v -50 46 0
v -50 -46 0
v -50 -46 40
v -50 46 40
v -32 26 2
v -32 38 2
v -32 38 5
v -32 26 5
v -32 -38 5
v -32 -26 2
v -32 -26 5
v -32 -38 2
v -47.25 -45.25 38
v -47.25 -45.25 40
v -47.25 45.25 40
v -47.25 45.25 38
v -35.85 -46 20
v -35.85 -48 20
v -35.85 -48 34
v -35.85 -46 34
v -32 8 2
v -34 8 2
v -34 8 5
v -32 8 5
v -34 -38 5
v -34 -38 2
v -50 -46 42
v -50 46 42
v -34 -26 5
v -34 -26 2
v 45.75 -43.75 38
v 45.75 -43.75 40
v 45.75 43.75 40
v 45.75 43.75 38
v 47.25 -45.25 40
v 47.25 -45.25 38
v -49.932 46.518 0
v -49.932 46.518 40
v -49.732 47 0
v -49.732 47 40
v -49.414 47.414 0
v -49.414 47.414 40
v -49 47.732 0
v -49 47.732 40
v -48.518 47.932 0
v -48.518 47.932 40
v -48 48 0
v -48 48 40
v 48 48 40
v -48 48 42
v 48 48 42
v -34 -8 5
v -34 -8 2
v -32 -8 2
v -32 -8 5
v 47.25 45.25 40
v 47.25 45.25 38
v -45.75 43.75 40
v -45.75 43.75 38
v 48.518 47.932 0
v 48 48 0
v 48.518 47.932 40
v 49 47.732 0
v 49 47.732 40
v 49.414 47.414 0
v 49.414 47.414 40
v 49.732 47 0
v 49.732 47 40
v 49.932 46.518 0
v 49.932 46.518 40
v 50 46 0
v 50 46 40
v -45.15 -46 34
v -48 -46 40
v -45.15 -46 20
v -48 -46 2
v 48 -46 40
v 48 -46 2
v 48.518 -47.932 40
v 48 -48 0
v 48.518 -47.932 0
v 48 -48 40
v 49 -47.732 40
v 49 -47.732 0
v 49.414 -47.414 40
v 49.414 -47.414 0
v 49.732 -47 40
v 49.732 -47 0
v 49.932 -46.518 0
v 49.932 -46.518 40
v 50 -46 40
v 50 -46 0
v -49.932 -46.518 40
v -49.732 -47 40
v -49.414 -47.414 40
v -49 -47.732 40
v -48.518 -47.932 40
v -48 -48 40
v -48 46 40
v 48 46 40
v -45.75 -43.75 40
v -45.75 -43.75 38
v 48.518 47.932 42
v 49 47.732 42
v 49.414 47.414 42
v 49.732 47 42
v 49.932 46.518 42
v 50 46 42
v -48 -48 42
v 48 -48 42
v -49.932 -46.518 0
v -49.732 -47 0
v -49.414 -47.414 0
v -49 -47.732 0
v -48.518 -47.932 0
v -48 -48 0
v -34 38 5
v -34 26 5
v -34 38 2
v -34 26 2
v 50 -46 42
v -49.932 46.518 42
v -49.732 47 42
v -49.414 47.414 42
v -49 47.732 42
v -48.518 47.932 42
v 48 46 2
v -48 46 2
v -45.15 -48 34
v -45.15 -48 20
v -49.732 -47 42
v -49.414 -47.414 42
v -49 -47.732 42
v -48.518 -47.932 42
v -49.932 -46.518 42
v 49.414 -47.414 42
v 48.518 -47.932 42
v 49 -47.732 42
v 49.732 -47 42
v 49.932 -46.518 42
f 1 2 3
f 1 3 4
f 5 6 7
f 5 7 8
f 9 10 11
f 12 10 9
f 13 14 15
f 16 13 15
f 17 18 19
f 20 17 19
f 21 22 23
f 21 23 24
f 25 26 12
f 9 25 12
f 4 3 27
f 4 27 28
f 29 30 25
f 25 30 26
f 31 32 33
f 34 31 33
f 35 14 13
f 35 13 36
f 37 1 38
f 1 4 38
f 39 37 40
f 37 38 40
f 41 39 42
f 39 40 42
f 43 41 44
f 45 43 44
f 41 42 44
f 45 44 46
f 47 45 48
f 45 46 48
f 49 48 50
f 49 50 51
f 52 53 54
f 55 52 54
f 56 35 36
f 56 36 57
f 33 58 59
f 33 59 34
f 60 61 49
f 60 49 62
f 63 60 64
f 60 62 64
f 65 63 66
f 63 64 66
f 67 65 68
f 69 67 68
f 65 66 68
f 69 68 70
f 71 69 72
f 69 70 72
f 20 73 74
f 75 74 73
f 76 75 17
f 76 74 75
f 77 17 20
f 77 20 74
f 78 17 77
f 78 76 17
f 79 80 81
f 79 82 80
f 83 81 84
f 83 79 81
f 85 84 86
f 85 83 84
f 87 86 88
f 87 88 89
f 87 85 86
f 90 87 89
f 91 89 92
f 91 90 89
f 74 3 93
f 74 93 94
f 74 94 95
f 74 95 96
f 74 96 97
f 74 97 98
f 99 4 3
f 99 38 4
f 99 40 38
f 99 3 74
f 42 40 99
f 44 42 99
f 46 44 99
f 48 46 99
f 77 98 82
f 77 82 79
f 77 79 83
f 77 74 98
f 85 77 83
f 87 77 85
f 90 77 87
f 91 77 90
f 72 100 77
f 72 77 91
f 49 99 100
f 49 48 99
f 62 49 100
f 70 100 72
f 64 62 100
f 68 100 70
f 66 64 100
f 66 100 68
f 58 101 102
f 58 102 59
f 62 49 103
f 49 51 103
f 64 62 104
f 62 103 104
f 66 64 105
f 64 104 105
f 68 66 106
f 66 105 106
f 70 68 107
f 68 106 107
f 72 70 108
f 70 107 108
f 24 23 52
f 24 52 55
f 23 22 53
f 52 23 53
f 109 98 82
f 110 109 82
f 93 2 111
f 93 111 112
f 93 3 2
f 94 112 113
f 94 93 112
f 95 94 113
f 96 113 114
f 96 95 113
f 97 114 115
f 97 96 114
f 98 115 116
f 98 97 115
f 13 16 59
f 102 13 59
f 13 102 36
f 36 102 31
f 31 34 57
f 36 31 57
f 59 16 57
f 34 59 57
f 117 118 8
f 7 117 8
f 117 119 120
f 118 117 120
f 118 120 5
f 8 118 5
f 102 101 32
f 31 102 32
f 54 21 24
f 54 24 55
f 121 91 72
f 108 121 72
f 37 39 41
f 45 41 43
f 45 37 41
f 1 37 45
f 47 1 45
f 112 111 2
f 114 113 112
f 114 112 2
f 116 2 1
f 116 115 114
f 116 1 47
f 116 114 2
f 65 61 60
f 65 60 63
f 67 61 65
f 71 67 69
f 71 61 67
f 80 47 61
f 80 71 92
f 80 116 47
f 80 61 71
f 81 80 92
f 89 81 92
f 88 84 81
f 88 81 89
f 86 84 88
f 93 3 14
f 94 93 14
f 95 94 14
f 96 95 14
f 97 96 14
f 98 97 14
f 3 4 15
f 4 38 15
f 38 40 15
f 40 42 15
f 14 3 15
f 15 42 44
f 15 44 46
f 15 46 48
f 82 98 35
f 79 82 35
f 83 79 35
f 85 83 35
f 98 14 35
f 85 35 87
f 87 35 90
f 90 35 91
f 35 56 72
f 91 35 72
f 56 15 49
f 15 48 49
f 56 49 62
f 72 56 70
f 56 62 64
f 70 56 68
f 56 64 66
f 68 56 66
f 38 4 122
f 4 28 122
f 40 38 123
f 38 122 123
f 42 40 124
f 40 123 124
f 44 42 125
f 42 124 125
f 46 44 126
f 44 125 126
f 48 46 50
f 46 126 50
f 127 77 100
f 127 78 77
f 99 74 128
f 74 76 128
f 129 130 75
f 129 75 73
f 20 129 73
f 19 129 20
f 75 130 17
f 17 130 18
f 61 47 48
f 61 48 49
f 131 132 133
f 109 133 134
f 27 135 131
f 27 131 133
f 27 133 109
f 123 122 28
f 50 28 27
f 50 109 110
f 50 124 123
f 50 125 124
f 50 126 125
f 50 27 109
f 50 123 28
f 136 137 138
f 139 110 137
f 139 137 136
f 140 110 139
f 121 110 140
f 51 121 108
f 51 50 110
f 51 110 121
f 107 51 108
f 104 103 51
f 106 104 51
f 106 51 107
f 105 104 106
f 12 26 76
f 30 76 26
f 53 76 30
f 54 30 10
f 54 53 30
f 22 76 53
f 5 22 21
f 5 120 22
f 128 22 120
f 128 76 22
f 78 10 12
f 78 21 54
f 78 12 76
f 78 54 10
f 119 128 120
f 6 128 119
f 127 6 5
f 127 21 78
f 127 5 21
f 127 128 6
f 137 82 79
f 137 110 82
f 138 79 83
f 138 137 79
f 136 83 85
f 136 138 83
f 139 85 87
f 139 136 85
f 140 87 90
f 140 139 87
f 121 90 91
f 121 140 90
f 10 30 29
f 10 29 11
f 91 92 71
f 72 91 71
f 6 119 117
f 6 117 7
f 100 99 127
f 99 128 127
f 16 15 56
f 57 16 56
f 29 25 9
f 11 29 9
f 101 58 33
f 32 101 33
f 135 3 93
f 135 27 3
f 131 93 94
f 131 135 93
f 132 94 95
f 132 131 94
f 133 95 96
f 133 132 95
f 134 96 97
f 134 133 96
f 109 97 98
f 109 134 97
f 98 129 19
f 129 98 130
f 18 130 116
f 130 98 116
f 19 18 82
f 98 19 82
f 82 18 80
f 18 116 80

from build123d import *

# Parameters (mm, degrees)
F0_W      = 100
F0_H      = 96
F1_DEPTH  = 40
F2_T      = -2
F3_W      = 9.3
F3_H      = 14
F4_DEPTH  = 2
F5_W      = 2
F5_H      = 12
F5_H_2    = 16
F6_DEPTH  = 5
F7_R      = 2
F9_W      = 100
F9_H      = 96
F10_DEPTH = 2
F8_W      = 94.5
F8_H      = 90.5
F8_W_2    = 91.5
F8_H_2    = 87.5
F11_DEPTH = 2
F12_R     = 2


# Not quite as in the source:
# - a feature names something its author has since deleted; it is built from what else it names


with BuildPart() as f1:
    # F0 (on Top) → F1 (new body)
    with BuildSketch(Plane.XY):
        Rectangle(F0_W, F0_H)
    extrude(amount=F1_DEPTH)

    # F2
    f2_openings = [f1.faces().sort_by_distance(p)[0] for p in [
        (0, 0, 40),
    ]]
    offset(amount=F2_T, openings=f2_openings)

    # F3 (on face) → F4 (cut, through all)
    with BuildSketch(Plane.XZ.offset(48)):
        with Locations((-40.5, 27)):
            Rectangle(F3_W, F3_H)
    extrude(amount=-F4_DEPTH, mode=Mode.SUBTRACT)

    # F5 (on face) → F6 (join)
    with BuildSketch(Plane(origin=(0, 0, 0), x_dir=(1, 0, 0), z_dir=(0, 0, -1))):
        with Locations((-33, 32)):
            Rectangle(F5_W, F5_H)
        with Locations((-33, 0)):
            Rectangle(F5_W, F5_H_2)
        with Locations((-33, -32)):
            Rectangle(F5_W, F5_H)
    extrude(amount=-F6_DEPTH)

    # F7
    f7_edges = [f1.edges().sort_by_distance(p)[0] for p in [
        (-50, -48, 20),
        (50, -48, 20),
        (50, 48, 20),
        (-50, 48, 20),
    ]]
    fillet(f7_edges, radius=F7_R)


with BuildPart() as f10:
    # F9 (on face) → F10 (new body)
    with BuildSketch(Plane.XY.offset(40)):
        Rectangle(F9_W, F9_H)
    extrude(amount=F10_DEPTH)

    # F8 (on face) → F11 (join)
    with BuildSketch(Plane.XY.offset(40)):
        Rectangle(F8_W, F8_H)
        Rectangle(F8_W_2, F8_H_2, mode=Mode.SUBTRACT)
    extrude(amount=-F11_DEPTH)

    # F12
    f12_edges = [f10.edges().sort_by_distance(p)[0] for p in [
        (-50, -48, 41),
        (50, -48, 41),
        (50, 48, 41),
        (-50, 48, 41),
    ]]
    fillet(f12_edges, radius=F12_R)


solid = Compound([f1.part, f10.part])
